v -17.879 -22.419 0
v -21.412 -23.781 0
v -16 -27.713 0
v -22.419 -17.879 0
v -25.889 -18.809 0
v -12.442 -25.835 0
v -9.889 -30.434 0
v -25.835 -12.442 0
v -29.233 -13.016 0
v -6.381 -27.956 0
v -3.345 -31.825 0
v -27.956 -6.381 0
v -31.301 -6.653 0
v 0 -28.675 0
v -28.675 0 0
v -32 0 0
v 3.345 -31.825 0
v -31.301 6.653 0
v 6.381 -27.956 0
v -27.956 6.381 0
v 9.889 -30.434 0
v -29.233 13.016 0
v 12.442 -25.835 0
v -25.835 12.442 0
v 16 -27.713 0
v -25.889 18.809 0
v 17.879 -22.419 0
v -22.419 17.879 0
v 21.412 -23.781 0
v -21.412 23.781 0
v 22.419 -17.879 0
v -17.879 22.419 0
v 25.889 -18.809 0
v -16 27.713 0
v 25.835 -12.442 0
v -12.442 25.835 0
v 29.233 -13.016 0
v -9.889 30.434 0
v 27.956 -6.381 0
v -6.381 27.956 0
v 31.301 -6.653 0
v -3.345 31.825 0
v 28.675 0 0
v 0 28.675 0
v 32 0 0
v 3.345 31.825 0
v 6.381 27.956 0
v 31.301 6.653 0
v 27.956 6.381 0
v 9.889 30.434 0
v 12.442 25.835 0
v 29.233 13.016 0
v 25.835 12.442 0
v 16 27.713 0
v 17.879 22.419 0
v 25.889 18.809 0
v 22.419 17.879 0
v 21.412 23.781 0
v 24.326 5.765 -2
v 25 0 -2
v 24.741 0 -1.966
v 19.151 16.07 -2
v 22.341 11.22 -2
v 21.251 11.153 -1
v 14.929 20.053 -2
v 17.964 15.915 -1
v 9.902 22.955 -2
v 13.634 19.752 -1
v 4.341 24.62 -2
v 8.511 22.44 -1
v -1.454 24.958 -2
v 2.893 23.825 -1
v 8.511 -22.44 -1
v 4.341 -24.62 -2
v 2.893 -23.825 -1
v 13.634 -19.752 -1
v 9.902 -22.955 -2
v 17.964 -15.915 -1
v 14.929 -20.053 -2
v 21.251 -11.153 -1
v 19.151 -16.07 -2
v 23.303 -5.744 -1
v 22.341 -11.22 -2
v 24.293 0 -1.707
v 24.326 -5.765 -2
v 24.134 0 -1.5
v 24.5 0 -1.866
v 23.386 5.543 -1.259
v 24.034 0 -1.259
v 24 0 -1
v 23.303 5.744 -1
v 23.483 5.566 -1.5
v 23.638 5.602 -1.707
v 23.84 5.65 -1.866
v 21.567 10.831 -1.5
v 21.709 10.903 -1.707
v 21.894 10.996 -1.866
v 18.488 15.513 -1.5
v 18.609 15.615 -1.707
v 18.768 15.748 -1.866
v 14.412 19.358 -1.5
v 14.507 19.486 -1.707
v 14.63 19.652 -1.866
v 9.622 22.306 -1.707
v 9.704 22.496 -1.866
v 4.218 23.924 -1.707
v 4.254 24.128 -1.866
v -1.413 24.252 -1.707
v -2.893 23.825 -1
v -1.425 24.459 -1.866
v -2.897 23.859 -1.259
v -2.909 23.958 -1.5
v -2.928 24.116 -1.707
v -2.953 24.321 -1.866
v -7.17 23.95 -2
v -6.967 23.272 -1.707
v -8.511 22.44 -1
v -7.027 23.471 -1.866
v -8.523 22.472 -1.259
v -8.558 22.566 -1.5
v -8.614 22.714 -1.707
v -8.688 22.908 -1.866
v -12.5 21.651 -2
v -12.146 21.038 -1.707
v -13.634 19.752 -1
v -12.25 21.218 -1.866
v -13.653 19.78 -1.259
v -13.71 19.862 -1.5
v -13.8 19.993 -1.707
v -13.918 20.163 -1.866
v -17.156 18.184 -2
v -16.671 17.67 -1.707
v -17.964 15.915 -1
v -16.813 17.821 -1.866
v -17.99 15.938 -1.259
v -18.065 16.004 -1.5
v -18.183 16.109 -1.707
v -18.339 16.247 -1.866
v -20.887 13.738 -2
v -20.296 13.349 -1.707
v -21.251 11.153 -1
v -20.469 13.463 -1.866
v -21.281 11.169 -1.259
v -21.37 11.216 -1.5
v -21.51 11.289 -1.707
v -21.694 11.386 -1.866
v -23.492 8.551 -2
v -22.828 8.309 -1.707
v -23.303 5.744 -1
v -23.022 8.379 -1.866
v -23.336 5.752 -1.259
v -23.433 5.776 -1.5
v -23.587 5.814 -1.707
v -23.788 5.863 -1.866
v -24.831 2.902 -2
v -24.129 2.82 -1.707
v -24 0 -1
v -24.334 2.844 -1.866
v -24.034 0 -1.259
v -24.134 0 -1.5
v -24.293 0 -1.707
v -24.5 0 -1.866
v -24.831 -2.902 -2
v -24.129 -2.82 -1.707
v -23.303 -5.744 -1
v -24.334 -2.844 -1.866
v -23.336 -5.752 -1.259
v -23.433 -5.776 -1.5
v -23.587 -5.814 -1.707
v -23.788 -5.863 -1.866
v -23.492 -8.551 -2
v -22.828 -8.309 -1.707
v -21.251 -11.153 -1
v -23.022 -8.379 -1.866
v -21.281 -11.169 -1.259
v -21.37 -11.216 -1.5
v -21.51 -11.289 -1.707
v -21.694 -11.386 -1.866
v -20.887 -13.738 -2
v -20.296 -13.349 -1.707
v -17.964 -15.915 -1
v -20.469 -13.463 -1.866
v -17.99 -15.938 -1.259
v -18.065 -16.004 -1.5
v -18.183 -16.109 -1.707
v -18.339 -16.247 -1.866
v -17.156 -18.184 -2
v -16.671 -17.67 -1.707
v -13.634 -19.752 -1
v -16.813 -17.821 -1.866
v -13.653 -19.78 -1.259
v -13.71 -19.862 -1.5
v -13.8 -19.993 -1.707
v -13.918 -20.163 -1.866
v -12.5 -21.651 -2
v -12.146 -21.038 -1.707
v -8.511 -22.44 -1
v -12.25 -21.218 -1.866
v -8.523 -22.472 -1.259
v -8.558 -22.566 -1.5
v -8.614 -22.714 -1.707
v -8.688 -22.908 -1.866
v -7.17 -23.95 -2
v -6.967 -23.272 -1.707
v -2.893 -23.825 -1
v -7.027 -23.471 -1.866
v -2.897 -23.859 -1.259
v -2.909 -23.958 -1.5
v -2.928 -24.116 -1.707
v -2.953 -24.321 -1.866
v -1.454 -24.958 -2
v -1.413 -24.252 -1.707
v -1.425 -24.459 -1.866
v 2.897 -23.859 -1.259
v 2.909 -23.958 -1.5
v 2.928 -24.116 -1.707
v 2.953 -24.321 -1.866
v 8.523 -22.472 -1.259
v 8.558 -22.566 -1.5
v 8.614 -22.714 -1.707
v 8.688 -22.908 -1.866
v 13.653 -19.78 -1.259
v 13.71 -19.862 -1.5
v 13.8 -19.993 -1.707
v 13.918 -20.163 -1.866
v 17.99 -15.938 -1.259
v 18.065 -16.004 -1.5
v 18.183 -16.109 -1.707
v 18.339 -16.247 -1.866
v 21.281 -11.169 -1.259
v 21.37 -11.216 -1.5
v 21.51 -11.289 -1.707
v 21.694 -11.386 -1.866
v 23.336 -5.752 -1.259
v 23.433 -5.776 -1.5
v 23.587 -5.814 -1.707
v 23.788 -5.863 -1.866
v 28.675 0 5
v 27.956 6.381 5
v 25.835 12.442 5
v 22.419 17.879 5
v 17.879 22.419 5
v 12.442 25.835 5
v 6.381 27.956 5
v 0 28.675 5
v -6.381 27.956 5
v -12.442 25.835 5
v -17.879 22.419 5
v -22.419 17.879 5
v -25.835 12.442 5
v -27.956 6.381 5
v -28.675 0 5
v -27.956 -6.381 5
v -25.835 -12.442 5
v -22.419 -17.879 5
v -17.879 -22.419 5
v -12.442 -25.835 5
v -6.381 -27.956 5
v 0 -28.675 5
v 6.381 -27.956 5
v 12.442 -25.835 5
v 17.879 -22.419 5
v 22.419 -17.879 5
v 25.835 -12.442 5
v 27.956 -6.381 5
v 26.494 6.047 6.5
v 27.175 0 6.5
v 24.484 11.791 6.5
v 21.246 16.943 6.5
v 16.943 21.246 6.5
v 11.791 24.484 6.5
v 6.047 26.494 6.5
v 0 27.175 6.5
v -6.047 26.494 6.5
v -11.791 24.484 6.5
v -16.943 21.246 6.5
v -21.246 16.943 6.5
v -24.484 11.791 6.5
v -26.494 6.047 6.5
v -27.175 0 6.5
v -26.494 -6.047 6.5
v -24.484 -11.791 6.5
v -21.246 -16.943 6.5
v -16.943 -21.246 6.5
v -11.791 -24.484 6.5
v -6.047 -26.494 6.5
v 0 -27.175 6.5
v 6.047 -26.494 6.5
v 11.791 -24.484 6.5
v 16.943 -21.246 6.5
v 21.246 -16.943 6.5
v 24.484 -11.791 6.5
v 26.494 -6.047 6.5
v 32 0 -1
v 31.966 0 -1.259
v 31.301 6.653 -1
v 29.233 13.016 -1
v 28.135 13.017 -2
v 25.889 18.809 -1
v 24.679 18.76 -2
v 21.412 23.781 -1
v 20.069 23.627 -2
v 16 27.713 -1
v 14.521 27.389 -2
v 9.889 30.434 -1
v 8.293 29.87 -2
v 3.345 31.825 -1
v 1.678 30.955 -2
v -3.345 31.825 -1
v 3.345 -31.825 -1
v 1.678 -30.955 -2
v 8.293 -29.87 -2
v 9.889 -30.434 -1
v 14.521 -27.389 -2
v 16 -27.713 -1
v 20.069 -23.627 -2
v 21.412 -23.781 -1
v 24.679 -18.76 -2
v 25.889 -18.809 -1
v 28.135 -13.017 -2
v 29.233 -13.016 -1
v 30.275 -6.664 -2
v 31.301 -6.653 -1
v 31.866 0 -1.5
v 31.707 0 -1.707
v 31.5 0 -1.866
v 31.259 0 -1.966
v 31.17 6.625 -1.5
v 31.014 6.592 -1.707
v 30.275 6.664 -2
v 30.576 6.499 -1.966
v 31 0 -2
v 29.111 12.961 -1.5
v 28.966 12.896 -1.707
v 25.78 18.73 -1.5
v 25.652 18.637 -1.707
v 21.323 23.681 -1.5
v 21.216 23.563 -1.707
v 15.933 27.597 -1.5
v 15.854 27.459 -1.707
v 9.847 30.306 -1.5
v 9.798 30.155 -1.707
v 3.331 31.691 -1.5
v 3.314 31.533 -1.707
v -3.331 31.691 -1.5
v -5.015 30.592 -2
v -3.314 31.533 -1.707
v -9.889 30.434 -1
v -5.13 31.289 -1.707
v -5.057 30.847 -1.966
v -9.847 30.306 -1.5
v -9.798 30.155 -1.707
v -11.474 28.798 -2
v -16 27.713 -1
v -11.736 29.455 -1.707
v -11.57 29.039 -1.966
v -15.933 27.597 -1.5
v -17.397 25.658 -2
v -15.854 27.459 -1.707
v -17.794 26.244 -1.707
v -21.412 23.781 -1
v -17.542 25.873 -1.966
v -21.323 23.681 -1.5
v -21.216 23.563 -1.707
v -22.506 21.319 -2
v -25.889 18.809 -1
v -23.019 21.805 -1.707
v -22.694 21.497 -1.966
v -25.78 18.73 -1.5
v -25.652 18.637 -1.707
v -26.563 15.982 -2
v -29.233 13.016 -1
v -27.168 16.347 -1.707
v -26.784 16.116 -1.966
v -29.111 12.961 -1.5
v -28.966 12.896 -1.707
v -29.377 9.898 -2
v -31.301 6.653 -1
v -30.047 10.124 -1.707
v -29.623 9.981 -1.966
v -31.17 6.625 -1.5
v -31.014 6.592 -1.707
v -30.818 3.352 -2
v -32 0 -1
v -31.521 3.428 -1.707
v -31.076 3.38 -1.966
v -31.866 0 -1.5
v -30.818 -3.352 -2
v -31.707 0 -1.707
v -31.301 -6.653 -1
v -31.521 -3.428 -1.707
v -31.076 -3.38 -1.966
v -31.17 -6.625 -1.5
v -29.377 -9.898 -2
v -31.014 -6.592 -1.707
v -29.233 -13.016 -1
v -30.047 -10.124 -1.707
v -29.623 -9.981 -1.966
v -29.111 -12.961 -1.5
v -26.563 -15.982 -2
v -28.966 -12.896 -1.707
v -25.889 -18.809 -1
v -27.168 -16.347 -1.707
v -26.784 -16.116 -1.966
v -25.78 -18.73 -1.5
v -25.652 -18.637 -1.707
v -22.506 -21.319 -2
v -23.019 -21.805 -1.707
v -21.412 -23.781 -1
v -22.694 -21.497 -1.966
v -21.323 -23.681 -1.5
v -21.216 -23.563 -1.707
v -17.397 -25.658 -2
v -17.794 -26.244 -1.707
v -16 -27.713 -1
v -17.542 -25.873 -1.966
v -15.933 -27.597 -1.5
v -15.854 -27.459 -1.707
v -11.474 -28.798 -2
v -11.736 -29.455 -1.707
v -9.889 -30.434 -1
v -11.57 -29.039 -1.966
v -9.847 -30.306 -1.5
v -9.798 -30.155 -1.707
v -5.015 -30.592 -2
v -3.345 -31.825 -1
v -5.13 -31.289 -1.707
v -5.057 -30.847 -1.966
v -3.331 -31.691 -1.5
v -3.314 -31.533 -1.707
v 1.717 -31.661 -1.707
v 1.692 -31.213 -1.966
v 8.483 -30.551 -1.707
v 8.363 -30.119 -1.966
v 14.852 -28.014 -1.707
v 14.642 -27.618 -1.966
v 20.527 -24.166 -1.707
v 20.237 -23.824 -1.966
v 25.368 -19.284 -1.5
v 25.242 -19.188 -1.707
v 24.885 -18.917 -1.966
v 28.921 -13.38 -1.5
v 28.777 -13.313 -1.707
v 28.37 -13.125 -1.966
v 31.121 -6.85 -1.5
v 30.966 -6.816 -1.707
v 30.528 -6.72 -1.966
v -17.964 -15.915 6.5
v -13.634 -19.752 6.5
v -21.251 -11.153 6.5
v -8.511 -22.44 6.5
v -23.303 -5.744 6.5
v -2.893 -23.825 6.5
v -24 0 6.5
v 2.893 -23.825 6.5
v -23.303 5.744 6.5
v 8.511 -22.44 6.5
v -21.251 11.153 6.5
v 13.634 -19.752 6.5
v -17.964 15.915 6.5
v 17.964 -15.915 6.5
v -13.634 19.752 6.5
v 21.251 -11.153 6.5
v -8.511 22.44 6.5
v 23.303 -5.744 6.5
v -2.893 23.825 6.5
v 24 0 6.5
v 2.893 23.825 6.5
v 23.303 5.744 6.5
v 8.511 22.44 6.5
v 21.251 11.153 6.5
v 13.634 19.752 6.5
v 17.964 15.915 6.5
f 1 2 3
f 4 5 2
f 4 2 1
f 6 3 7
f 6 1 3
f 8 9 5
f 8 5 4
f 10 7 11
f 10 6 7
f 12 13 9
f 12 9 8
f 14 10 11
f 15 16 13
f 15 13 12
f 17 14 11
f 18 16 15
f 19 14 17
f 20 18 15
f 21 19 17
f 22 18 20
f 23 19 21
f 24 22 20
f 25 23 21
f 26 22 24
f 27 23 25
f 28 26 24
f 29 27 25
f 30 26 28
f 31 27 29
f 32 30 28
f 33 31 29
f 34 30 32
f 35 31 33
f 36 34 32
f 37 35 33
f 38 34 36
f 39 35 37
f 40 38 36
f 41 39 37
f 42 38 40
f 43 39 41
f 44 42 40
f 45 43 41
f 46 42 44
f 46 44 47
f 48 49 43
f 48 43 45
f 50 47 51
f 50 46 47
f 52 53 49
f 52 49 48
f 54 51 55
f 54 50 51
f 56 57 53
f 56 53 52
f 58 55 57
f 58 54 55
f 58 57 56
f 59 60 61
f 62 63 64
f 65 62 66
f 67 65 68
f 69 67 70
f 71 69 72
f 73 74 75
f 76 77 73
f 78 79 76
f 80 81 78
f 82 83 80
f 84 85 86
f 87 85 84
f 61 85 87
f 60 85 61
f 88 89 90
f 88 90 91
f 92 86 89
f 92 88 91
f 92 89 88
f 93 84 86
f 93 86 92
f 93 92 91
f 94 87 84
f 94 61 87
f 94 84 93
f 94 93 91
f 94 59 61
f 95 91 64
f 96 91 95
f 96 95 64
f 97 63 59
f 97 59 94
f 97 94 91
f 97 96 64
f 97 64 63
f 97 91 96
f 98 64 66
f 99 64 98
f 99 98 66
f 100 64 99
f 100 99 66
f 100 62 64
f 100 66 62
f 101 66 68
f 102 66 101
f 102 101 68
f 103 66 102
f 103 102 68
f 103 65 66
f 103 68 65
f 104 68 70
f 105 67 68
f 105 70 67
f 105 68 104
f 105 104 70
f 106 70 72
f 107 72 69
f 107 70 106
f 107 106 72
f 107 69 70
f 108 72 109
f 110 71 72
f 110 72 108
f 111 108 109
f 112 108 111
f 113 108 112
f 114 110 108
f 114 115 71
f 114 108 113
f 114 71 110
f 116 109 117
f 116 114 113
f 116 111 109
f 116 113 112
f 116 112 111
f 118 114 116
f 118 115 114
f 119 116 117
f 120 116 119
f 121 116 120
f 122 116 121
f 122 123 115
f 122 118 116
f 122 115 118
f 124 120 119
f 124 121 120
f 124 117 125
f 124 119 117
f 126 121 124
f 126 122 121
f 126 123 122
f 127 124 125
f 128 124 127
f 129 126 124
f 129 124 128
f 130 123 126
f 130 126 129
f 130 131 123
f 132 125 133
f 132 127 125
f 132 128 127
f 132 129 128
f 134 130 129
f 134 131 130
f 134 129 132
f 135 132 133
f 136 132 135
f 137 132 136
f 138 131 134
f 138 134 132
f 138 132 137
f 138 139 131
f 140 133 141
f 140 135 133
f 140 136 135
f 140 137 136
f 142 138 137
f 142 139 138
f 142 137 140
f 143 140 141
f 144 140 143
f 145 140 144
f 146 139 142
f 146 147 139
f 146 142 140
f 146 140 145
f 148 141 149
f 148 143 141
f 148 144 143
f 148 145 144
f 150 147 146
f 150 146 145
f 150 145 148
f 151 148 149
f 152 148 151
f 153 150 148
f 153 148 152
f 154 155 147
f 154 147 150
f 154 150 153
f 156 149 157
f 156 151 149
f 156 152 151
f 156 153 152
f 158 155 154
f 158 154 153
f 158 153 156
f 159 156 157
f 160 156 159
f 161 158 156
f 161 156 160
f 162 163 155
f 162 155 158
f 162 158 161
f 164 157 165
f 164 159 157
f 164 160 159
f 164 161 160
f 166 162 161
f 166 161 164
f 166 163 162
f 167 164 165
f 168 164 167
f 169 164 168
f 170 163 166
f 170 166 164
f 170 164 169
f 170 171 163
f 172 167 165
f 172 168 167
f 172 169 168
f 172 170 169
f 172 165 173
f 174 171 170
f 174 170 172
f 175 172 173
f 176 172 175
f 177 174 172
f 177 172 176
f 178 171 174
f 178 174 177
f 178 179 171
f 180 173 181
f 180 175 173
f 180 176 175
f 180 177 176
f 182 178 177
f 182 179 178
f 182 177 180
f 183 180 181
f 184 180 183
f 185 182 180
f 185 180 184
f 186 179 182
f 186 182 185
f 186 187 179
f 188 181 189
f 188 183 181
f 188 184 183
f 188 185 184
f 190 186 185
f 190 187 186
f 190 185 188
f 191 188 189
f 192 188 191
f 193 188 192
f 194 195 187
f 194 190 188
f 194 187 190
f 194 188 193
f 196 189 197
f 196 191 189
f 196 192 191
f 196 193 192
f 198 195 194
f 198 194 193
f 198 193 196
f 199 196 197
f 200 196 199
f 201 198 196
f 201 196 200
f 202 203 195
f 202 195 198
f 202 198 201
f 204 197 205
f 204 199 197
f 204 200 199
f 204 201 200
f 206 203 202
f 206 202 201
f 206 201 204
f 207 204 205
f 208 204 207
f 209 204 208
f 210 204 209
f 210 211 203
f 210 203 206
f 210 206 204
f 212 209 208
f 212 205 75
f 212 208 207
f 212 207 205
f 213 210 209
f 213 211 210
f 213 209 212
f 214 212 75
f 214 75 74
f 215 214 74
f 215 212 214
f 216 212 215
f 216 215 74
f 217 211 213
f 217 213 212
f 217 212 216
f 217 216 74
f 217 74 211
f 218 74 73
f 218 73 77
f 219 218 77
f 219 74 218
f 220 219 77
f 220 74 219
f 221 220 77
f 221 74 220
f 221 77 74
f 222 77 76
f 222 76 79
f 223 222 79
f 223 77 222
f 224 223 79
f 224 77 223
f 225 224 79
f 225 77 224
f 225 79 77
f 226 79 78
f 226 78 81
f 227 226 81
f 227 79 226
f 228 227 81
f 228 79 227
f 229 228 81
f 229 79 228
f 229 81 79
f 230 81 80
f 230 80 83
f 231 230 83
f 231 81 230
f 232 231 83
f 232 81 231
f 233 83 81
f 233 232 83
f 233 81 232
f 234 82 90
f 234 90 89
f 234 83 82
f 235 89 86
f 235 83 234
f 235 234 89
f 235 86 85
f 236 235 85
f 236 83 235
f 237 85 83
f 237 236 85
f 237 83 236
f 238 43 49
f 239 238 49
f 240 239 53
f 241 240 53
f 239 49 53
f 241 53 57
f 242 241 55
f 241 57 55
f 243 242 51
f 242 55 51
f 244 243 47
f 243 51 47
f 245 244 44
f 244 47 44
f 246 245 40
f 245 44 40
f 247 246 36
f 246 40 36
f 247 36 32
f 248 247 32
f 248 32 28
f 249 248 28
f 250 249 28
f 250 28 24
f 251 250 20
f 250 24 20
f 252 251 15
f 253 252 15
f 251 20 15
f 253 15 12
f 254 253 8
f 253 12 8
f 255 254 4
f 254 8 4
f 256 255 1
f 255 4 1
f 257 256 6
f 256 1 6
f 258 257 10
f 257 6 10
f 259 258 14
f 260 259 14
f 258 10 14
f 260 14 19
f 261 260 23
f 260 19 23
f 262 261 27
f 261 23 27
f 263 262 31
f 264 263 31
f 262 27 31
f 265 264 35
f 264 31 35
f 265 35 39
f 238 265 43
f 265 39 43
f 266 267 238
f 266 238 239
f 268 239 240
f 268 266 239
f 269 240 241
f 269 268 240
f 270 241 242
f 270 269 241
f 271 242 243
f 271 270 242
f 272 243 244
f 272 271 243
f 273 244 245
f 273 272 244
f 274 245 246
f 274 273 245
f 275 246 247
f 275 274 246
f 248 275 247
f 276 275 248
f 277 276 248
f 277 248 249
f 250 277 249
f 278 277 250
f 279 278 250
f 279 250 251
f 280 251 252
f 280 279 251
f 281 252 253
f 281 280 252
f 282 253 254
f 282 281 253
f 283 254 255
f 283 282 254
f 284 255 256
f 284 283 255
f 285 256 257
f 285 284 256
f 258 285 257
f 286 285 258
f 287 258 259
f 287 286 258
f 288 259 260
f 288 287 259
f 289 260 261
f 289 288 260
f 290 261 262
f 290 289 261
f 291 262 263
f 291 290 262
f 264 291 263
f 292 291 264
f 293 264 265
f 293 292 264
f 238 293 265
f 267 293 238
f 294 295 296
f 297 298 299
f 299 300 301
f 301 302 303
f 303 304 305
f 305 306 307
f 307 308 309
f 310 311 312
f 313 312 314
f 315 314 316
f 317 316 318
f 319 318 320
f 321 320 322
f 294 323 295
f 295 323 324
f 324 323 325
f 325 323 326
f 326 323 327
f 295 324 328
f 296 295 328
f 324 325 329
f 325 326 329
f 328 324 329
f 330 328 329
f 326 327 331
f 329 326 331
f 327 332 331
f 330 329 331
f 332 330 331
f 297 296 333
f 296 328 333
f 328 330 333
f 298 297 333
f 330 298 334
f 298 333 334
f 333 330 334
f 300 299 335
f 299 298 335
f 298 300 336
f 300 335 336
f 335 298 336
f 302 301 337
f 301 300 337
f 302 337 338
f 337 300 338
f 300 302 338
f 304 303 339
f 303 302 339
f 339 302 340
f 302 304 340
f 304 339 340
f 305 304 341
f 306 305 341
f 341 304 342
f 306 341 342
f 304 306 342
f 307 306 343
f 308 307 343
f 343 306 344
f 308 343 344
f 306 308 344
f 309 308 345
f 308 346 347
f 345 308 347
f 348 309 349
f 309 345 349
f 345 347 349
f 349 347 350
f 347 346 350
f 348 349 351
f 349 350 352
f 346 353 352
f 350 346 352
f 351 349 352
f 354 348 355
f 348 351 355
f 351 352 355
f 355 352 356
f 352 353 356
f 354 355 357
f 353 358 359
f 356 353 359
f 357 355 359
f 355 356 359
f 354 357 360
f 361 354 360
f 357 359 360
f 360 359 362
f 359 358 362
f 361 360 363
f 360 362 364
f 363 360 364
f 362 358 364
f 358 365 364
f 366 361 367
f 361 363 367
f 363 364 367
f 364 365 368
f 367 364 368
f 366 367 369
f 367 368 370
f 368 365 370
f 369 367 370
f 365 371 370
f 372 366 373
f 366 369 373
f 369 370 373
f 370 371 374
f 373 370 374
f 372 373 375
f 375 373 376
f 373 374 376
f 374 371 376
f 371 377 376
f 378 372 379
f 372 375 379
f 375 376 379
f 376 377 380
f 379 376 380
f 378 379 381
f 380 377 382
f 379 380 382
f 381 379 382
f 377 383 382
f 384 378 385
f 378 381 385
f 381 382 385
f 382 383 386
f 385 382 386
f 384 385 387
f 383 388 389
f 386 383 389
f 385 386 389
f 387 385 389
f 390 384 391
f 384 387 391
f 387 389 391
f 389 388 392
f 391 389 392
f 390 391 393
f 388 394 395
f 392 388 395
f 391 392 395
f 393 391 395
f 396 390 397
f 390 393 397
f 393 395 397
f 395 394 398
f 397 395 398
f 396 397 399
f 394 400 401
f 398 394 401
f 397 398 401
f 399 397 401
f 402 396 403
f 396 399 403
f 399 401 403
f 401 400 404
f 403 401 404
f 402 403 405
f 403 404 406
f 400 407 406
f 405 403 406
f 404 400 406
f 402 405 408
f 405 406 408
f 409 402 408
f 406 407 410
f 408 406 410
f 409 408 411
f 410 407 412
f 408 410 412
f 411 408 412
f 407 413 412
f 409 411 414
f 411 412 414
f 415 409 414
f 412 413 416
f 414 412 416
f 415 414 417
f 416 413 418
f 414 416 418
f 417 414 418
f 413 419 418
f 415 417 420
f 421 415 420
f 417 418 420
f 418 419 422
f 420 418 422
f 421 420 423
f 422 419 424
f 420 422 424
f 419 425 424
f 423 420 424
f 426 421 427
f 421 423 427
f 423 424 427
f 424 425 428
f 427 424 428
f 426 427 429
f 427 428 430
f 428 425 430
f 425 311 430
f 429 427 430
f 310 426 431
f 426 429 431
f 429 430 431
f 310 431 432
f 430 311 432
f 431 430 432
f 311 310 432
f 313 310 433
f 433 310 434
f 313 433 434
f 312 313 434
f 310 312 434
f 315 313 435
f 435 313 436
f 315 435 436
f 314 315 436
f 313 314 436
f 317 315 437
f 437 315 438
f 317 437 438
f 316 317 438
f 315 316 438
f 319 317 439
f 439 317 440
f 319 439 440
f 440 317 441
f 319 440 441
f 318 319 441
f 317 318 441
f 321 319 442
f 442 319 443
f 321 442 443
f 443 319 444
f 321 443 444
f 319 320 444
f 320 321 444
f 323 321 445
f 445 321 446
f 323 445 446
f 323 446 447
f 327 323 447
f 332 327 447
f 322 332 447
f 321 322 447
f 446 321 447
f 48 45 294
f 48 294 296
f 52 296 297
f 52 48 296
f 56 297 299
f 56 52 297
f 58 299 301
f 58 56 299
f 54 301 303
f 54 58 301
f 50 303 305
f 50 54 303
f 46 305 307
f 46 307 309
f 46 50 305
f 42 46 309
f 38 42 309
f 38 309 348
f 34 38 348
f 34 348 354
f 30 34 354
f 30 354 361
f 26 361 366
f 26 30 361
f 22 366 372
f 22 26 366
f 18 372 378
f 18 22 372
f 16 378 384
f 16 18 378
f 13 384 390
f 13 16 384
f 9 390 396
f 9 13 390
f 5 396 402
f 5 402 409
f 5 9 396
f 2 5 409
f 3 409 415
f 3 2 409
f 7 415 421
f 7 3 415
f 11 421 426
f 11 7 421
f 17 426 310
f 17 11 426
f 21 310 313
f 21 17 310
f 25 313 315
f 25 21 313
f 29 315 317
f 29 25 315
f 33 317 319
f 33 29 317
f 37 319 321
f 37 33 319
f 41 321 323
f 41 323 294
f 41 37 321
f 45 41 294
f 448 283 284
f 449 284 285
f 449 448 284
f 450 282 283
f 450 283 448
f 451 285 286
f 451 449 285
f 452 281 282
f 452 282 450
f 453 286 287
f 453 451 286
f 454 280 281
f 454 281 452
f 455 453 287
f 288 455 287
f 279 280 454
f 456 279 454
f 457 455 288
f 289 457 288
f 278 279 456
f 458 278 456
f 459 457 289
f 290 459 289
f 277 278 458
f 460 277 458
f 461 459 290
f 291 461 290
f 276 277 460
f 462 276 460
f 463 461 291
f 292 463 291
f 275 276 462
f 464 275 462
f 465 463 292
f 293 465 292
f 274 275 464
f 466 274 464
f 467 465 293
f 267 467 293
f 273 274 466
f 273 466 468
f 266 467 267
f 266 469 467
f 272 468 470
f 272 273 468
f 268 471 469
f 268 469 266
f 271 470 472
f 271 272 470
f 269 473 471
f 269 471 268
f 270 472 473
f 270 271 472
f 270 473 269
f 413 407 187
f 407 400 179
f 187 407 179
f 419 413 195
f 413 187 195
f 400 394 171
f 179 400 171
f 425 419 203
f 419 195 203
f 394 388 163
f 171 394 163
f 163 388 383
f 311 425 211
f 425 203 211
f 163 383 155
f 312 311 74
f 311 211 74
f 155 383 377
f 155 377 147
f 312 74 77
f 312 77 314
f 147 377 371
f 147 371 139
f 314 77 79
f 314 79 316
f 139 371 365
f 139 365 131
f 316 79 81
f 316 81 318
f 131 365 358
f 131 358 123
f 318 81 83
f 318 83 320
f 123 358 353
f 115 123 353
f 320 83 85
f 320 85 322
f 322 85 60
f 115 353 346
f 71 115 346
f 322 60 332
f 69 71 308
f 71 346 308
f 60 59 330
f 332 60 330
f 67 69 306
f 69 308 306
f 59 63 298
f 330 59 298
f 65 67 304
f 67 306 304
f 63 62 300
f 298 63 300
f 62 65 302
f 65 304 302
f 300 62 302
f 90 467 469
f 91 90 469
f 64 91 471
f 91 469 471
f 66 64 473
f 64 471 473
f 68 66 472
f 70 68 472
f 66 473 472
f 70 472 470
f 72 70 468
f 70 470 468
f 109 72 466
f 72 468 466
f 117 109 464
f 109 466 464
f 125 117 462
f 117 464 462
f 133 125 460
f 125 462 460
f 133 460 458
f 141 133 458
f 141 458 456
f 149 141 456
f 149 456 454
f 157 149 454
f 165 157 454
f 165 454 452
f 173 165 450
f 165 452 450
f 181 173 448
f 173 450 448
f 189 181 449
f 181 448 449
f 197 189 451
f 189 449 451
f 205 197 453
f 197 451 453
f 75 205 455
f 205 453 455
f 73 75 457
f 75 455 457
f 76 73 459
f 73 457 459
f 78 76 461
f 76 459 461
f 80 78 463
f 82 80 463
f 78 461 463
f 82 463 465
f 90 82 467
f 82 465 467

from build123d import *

# Parameters (mm, degrees)
F0_R     = 32
F3_DEPTH = 2
F1_R     = 28.675
F4_DEPTH = 6.5
F2_R     = 24
F5_DEPTH = 10
F6_SIZE  = 1.5
F7_R     = 1


with BuildPart() as f3:
    # F0 (on Top) → F3 (new body)
    with BuildSketch(Plane.XY):
        Circle(F0_R)
    extrude(amount=-F3_DEPTH)

    # F1 (on Top) → F4 (join)
    with BuildSketch(Plane.XY):
        Circle(F1_R)
    extrude(amount=F4_DEPTH)

    # F2 (on Top) → F5 (cut, symmetric)
    with BuildSketch(Plane.XY):
        Circle(F2_R)
    extrude(amount=F5_DEPTH, both=True, mode=Mode.SUBTRACT)

    # F6
    f6_edges = [f3.edges().sort_by_distance(p)[0] for p in [
        (-28.675, 0, 6.5),
    ]]
    chamfer(f6_edges, length=F6_SIZE)

    # F7
    f7_edges = [f3.edges().sort_by_distance(p)[0] for p in [
        (-24, 0, -2),
        (-32, 0, -2),
    ]]
    fillet(f7_edges, radius=F7_R)


solid = f3.part
